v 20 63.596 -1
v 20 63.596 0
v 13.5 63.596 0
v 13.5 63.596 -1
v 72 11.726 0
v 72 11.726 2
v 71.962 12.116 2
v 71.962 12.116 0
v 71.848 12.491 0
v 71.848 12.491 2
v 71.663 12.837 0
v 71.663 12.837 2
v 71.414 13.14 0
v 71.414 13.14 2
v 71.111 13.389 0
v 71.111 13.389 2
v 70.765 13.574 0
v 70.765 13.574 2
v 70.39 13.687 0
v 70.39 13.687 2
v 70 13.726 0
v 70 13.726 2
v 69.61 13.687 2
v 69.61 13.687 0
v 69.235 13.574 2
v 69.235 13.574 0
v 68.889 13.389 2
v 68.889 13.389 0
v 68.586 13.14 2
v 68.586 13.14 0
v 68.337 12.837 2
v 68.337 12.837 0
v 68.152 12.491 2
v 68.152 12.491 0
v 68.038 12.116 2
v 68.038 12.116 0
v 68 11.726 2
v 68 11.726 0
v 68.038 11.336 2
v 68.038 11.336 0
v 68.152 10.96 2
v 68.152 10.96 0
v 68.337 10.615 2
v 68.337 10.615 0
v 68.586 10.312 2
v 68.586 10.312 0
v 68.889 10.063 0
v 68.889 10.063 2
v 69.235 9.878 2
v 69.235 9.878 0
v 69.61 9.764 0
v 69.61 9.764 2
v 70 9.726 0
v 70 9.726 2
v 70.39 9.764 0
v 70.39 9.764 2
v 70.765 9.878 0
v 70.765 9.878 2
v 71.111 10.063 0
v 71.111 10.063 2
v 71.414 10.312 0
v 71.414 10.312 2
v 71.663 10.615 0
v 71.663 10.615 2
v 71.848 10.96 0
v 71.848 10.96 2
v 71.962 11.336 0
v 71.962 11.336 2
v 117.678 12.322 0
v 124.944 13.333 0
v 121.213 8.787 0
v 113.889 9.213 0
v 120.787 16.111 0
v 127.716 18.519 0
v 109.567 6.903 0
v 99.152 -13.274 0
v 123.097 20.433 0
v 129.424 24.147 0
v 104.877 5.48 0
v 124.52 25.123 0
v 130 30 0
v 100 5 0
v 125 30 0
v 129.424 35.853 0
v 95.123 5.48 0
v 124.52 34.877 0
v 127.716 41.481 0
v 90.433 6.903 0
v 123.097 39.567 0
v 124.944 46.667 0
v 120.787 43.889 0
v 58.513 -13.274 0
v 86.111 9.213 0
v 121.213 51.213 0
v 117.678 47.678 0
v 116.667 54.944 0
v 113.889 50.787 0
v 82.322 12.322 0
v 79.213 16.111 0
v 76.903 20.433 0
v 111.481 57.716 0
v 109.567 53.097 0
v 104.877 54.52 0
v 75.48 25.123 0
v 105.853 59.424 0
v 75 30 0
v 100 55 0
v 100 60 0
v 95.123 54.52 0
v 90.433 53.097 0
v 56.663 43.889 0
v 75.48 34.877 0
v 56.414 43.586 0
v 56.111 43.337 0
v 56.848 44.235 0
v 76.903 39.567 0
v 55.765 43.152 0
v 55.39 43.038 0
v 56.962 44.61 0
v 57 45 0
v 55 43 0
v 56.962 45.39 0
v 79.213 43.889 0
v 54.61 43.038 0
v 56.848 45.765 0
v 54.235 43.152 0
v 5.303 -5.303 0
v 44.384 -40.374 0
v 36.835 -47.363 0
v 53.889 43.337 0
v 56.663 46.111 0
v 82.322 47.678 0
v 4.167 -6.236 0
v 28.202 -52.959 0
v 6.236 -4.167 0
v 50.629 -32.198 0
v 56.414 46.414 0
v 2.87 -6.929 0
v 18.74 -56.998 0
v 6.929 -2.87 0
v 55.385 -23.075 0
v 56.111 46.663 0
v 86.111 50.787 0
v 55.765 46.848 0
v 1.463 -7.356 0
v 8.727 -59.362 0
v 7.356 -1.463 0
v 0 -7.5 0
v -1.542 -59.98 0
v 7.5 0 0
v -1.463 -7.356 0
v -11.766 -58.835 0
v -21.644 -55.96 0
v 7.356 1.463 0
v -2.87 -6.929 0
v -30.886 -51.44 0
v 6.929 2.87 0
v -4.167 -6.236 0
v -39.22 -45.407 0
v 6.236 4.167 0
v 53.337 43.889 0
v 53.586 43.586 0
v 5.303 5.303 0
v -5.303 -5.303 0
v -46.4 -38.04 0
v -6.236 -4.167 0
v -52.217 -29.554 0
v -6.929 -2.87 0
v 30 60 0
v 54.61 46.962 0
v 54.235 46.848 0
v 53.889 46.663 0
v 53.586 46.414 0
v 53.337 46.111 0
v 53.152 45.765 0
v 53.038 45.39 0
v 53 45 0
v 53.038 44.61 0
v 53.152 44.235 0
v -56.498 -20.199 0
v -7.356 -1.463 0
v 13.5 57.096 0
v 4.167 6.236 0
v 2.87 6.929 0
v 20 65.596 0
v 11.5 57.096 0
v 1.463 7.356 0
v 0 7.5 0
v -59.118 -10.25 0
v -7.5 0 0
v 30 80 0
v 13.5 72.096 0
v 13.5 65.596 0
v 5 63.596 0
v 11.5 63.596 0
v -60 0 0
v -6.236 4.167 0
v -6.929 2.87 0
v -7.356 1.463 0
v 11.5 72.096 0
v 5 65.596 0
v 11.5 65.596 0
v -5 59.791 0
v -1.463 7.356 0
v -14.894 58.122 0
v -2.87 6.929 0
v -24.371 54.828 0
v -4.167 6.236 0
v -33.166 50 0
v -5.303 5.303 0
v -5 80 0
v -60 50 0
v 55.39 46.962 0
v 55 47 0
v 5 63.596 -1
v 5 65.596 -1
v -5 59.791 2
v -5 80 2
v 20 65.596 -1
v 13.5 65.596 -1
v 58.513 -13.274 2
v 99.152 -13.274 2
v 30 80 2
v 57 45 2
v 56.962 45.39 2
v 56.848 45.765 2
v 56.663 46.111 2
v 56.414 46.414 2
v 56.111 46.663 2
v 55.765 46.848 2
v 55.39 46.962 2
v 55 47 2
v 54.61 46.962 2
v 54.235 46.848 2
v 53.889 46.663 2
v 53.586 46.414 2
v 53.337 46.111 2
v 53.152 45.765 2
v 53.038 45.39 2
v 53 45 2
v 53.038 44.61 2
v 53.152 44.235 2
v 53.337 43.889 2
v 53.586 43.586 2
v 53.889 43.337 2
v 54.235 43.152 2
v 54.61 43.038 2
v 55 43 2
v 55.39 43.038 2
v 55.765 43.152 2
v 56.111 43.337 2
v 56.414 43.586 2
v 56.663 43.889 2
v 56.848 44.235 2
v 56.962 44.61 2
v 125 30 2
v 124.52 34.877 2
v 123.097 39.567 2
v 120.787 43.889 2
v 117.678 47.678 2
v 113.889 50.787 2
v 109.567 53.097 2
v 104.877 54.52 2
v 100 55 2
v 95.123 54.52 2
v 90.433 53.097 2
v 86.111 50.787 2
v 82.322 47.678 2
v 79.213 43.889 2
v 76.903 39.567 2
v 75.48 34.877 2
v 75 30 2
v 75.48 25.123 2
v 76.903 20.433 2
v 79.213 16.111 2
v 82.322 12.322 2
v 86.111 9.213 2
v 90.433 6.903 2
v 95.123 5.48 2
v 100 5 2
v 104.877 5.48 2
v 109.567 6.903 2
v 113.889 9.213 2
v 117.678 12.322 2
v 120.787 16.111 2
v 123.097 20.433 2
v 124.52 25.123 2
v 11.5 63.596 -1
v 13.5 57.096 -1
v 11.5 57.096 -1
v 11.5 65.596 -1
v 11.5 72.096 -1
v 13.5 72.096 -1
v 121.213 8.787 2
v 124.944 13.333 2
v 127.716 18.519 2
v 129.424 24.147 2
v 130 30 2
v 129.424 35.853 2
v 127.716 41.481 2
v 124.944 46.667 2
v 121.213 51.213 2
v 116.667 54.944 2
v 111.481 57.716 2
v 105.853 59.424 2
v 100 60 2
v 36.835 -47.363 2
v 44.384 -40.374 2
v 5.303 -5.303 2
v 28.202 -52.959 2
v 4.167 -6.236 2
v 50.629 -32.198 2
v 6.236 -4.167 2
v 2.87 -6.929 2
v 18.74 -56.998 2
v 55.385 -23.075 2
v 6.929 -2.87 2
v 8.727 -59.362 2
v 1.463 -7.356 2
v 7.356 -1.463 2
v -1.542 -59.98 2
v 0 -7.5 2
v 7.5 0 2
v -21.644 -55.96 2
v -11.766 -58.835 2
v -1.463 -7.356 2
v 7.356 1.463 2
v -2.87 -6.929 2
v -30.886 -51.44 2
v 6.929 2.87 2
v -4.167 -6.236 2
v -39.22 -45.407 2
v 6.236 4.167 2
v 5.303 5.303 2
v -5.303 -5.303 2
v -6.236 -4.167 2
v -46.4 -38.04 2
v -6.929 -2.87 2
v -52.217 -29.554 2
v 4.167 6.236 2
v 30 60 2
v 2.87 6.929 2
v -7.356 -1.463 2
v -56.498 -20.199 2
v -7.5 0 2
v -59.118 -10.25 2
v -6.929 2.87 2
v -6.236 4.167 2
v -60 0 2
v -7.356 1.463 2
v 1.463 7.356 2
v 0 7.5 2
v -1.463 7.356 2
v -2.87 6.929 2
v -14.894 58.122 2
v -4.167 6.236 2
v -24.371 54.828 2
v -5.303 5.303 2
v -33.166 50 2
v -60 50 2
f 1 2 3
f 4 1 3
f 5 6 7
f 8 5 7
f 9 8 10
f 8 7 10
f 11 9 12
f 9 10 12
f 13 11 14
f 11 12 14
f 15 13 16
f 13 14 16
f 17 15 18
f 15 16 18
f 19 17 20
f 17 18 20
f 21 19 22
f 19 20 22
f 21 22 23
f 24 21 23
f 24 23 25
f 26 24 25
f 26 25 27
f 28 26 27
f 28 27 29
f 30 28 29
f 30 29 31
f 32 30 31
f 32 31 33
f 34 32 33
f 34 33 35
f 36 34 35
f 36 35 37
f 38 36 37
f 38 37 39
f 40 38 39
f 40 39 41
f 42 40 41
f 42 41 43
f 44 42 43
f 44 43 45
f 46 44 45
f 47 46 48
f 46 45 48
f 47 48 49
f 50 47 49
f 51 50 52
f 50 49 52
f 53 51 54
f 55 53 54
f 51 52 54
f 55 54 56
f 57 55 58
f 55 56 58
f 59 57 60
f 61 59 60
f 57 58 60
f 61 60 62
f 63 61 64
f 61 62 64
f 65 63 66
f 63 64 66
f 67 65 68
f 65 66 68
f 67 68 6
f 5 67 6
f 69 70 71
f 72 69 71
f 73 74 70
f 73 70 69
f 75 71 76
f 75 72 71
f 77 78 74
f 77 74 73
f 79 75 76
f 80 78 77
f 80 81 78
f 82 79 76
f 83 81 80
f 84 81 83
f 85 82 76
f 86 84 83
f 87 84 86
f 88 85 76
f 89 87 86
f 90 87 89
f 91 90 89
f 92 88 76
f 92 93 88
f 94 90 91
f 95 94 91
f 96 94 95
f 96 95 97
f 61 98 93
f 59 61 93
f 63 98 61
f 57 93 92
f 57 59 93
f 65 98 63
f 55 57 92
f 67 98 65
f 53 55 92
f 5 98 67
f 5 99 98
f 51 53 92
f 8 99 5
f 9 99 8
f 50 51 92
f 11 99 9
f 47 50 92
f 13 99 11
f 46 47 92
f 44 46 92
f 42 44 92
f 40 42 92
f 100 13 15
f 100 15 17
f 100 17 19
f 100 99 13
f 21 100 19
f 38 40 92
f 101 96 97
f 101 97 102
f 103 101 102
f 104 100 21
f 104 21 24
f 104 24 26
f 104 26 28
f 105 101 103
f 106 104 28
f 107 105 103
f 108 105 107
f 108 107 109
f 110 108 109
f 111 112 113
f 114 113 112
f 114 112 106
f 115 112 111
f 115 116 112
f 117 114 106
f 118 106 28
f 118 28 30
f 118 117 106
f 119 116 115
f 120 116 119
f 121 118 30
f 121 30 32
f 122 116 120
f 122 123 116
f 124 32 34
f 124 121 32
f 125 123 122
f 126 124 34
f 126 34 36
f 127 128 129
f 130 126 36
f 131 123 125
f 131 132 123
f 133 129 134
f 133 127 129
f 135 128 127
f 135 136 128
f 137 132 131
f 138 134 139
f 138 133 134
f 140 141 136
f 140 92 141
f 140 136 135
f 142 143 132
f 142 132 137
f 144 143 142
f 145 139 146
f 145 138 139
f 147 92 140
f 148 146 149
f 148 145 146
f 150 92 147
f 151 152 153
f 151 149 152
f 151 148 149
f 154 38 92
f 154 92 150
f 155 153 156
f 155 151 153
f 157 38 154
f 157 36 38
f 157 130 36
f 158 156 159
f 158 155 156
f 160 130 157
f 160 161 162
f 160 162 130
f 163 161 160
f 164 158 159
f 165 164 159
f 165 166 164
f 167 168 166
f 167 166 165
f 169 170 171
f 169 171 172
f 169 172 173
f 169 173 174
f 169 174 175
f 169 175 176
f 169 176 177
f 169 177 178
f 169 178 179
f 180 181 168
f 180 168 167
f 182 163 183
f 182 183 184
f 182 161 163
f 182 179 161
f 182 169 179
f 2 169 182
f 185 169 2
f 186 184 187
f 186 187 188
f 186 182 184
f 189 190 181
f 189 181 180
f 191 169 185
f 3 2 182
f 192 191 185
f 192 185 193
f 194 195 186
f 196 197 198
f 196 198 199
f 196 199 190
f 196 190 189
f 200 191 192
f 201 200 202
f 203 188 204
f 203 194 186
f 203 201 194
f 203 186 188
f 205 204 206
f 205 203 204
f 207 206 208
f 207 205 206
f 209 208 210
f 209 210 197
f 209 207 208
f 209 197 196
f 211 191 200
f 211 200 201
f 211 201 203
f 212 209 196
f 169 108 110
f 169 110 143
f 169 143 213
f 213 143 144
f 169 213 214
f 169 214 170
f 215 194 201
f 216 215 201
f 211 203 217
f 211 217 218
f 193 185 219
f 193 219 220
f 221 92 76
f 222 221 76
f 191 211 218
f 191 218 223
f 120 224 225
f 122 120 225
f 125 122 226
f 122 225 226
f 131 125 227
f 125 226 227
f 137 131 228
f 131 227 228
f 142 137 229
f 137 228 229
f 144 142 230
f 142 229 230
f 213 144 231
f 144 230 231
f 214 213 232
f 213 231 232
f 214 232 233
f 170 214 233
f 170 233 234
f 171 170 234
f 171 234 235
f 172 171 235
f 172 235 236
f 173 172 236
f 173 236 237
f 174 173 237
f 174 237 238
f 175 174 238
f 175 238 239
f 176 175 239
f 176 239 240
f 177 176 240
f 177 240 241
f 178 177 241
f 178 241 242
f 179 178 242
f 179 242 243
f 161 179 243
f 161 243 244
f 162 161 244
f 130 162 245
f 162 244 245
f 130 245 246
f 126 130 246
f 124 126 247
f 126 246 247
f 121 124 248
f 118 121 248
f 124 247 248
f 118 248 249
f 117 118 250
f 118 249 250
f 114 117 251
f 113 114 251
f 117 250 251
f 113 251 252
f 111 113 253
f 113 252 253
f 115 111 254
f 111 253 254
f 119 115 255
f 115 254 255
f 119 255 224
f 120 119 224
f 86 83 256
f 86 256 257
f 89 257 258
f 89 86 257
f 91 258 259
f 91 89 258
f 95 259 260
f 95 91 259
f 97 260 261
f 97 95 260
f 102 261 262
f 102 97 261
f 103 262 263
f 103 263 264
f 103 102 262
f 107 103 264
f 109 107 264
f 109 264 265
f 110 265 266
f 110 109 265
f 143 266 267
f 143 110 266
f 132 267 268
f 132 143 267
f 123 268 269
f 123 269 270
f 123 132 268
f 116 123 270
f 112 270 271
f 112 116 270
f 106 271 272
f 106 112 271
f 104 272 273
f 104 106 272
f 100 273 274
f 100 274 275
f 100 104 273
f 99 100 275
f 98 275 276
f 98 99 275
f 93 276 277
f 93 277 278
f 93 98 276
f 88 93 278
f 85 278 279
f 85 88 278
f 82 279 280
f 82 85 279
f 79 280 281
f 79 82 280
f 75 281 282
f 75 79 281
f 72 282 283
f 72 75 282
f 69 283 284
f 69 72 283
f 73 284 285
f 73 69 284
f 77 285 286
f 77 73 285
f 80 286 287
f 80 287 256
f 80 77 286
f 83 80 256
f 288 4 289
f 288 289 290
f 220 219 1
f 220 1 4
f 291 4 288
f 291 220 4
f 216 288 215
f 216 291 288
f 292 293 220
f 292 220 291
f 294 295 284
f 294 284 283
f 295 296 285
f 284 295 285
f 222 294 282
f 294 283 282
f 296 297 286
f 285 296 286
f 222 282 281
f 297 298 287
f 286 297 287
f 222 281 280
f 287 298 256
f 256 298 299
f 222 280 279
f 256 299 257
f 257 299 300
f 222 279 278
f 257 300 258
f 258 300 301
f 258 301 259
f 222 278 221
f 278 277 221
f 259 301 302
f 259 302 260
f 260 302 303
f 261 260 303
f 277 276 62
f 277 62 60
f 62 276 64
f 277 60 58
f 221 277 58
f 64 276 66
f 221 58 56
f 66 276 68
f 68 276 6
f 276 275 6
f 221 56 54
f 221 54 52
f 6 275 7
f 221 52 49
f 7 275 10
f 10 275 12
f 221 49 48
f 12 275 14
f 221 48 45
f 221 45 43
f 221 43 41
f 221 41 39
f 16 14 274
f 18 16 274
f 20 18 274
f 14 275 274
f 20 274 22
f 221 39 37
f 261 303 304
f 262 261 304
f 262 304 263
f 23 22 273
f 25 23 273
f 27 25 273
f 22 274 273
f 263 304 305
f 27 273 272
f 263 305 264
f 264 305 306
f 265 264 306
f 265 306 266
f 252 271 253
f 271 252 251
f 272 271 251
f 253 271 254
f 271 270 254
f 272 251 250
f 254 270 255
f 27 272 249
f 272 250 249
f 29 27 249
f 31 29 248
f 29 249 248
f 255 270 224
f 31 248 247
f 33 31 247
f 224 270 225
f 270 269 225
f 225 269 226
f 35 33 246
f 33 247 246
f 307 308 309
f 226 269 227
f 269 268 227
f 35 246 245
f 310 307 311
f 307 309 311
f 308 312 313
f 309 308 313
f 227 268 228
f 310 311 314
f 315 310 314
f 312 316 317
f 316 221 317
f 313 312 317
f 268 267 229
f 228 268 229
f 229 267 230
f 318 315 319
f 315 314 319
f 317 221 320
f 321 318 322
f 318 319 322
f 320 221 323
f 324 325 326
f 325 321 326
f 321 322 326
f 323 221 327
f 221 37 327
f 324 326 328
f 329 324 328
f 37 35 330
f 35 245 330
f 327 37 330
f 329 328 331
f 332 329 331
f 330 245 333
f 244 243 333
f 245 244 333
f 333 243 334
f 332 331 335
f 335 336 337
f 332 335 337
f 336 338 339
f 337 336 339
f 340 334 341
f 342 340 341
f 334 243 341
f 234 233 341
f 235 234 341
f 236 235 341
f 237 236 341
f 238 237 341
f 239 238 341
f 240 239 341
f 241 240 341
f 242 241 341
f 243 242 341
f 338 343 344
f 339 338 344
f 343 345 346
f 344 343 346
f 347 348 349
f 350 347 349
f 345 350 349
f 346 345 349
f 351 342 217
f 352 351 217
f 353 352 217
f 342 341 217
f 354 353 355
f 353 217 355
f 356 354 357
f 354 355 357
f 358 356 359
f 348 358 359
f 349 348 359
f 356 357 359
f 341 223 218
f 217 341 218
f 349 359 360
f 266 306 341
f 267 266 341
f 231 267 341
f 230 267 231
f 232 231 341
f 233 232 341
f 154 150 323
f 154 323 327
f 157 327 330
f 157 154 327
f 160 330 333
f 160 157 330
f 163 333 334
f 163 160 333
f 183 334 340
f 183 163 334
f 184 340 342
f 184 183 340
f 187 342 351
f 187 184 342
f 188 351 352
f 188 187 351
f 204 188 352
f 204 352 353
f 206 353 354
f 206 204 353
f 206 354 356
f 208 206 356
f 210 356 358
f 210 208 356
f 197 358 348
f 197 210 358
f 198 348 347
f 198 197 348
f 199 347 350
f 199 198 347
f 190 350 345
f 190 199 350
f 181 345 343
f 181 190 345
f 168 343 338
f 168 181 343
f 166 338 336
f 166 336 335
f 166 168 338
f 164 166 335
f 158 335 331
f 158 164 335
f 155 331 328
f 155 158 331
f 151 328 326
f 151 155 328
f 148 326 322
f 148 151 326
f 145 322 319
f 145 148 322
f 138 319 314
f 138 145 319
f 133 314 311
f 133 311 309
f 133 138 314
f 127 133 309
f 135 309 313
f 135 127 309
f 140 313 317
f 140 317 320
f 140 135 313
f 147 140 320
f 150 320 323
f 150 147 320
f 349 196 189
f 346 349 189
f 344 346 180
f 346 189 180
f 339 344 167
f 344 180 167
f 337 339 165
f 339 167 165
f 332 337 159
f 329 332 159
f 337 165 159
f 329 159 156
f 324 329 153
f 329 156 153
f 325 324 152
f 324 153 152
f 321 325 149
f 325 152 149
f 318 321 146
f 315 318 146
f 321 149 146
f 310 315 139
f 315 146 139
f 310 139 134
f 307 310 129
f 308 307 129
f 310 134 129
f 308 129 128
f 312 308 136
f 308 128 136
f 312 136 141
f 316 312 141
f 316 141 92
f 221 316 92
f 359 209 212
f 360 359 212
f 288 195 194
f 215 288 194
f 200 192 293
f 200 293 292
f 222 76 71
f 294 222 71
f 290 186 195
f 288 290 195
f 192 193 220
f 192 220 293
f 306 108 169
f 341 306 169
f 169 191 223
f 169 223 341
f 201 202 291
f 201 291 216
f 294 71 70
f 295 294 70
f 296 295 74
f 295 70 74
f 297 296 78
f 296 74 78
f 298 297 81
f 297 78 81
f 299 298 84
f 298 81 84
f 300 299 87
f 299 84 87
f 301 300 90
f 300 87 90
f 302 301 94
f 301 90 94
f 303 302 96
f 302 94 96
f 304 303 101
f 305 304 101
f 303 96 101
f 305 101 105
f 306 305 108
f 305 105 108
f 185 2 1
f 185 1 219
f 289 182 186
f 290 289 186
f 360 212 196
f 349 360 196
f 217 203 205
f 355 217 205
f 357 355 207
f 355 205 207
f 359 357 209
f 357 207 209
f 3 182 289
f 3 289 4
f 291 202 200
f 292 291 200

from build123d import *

# Parameters (mm, degrees)
SKETCH1_R           = 7.5
SKETCH1_R_2         = 25
BOSS_EXTRUDE1_DEPTH = 2
CUT_EXTRUDE1_REACH  = 145.192
SKETCH2_R           = 2
BOSS_EXTRUDE2_DEPTH = 2
SKETCH4_W           = 2
SKETCH4_H           = 6.5
SKETCH4_W_2         = 6.5
SKETCH4_H_2         = 2
BOSS_EXTRUDE3_DEPTH = 1


with BuildPart() as part:
    # Sketch1 → Boss-Extrude1 (new body)
    # profile 1 of 2: a face of its own
    with BuildSketch(Plane.XY):
        with BuildLine():
            ThreePointArc((-60, 0), (-52.867640737, 28.372743309), (-33.166247904, 50))
            Line((-33.166247904, 50), (-60, 50))
            Line((-60, 50), (-60, 0))
        make_face()
    # profile 2 of 2: a face of its own
    with BuildSketch(Plane.XY):
        with BuildLine():
            ThreePointArc((0, 60), (-17.320508076, 57.445626465), (-33.166247904, 50))
            ThreePointArc((-33.166247904, 50), (-52.867640737, 28.372743309), (-60, 0))
            ThreePointArc((-60, 0), (-6.678621673, -59.627141576), (58.513200418, -13.274237334))
            Line((58.513200418, -13.274237334), (99.152169538, -13.274237334))
            Line((99.152169538, -13.274237334), (121.213203436, 8.786796564))
            ThreePointArc((121.213203436, 8.786796564), (127.716385975, 41.480502971), (100, 60))
            Line((100, 60), (0, 60))
        make_face()
        Circle(SKETCH1_R, mode=Mode.SUBTRACT)
        with Locations((100, 30)):
            Circle(SKETCH1_R_2, mode=Mode.SUBTRACT)
    extrude(amount=BOSS_EXTRUDE1_DEPTH)

    # Sketch2 → Cut-Extrude1 (cut, up to next)
    with BuildSketch(Plane.XY.offset(2), mode=Mode.PRIVATE) as cut_extrude1_sk1:
        with Locations((55, 45)):
            Circle(SKETCH2_R)
    cut_extrude1_tool1 = extrude(cut_extrude1_sk1.sketch, amount=-CUT_EXTRUDE1_REACH, mode=Mode.PRIVATE) & part.part
    # Sketch2 → Cut-Extrude1 (cut, up to next)
    with BuildSketch(Plane.XY.offset(2), mode=Mode.PRIVATE) as cut_extrude1_sk2:
        with Locations((70, 11.725762666)):
            Circle(SKETCH2_R)
    cut_extrude1_tool2 = extrude(cut_extrude1_sk2.sketch, amount=-CUT_EXTRUDE1_REACH, mode=Mode.PRIVATE) & part.part
    add(cut_extrude1_tool1.solids().sort_by_distance((55, 45, 2))[0], mode=Mode.SUBTRACT)
    add(cut_extrude1_tool2.solids().sort_by_distance((70, 11.725763, 2))[0], mode=Mode.SUBTRACT)

    # Sketch3 → Boss-Extrude2 (add)
    with BuildSketch(Plane(origin=(0, 0, 0), x_dir=(-1, 0, 0), z_dir=(0, 0, -1))):
        with BuildLine():
            Line((-30, 80), (-30, 60))
            Line((-30, 60), (0, 60))
            ThreePointArc((0, 60), (2.502176759, 59.947803225), (5, 59.791303715))
            Line((5, 59.791303715), (5, 80))
            Line((5, 80), (-30, 80))
        make_face()
    extrude(amount=-BOSS_EXTRUDE2_DEPTH)

    # Sketch4 → Boss-Extrude3 (add)
    with BuildSketch(Plane(origin=(0, 0, 0), x_dir=(-1, 0, 0), z_dir=(0, 0, -1))):
        with Locations((-12.5, 68.846087829)):
            Rectangle(SKETCH4_W, SKETCH4_H)
        with Locations((-16.75, 64.596087829)):
            Rectangle(SKETCH4_W_2, SKETCH4_H_2)
        with Locations((-12.5, 64.596087829)):
            Rectangle(SKETCH4_W, SKETCH4_H_2)
        with Locations((-8.25, 64.596087829)):
            Rectangle(SKETCH4_W_2, SKETCH4_H_2)
        with Locations((-12.5, 60.346087829)):
            Rectangle(SKETCH4_W, SKETCH4_H)
    extrude(amount=BOSS_EXTRUDE3_DEPTH)


solid = part.part
